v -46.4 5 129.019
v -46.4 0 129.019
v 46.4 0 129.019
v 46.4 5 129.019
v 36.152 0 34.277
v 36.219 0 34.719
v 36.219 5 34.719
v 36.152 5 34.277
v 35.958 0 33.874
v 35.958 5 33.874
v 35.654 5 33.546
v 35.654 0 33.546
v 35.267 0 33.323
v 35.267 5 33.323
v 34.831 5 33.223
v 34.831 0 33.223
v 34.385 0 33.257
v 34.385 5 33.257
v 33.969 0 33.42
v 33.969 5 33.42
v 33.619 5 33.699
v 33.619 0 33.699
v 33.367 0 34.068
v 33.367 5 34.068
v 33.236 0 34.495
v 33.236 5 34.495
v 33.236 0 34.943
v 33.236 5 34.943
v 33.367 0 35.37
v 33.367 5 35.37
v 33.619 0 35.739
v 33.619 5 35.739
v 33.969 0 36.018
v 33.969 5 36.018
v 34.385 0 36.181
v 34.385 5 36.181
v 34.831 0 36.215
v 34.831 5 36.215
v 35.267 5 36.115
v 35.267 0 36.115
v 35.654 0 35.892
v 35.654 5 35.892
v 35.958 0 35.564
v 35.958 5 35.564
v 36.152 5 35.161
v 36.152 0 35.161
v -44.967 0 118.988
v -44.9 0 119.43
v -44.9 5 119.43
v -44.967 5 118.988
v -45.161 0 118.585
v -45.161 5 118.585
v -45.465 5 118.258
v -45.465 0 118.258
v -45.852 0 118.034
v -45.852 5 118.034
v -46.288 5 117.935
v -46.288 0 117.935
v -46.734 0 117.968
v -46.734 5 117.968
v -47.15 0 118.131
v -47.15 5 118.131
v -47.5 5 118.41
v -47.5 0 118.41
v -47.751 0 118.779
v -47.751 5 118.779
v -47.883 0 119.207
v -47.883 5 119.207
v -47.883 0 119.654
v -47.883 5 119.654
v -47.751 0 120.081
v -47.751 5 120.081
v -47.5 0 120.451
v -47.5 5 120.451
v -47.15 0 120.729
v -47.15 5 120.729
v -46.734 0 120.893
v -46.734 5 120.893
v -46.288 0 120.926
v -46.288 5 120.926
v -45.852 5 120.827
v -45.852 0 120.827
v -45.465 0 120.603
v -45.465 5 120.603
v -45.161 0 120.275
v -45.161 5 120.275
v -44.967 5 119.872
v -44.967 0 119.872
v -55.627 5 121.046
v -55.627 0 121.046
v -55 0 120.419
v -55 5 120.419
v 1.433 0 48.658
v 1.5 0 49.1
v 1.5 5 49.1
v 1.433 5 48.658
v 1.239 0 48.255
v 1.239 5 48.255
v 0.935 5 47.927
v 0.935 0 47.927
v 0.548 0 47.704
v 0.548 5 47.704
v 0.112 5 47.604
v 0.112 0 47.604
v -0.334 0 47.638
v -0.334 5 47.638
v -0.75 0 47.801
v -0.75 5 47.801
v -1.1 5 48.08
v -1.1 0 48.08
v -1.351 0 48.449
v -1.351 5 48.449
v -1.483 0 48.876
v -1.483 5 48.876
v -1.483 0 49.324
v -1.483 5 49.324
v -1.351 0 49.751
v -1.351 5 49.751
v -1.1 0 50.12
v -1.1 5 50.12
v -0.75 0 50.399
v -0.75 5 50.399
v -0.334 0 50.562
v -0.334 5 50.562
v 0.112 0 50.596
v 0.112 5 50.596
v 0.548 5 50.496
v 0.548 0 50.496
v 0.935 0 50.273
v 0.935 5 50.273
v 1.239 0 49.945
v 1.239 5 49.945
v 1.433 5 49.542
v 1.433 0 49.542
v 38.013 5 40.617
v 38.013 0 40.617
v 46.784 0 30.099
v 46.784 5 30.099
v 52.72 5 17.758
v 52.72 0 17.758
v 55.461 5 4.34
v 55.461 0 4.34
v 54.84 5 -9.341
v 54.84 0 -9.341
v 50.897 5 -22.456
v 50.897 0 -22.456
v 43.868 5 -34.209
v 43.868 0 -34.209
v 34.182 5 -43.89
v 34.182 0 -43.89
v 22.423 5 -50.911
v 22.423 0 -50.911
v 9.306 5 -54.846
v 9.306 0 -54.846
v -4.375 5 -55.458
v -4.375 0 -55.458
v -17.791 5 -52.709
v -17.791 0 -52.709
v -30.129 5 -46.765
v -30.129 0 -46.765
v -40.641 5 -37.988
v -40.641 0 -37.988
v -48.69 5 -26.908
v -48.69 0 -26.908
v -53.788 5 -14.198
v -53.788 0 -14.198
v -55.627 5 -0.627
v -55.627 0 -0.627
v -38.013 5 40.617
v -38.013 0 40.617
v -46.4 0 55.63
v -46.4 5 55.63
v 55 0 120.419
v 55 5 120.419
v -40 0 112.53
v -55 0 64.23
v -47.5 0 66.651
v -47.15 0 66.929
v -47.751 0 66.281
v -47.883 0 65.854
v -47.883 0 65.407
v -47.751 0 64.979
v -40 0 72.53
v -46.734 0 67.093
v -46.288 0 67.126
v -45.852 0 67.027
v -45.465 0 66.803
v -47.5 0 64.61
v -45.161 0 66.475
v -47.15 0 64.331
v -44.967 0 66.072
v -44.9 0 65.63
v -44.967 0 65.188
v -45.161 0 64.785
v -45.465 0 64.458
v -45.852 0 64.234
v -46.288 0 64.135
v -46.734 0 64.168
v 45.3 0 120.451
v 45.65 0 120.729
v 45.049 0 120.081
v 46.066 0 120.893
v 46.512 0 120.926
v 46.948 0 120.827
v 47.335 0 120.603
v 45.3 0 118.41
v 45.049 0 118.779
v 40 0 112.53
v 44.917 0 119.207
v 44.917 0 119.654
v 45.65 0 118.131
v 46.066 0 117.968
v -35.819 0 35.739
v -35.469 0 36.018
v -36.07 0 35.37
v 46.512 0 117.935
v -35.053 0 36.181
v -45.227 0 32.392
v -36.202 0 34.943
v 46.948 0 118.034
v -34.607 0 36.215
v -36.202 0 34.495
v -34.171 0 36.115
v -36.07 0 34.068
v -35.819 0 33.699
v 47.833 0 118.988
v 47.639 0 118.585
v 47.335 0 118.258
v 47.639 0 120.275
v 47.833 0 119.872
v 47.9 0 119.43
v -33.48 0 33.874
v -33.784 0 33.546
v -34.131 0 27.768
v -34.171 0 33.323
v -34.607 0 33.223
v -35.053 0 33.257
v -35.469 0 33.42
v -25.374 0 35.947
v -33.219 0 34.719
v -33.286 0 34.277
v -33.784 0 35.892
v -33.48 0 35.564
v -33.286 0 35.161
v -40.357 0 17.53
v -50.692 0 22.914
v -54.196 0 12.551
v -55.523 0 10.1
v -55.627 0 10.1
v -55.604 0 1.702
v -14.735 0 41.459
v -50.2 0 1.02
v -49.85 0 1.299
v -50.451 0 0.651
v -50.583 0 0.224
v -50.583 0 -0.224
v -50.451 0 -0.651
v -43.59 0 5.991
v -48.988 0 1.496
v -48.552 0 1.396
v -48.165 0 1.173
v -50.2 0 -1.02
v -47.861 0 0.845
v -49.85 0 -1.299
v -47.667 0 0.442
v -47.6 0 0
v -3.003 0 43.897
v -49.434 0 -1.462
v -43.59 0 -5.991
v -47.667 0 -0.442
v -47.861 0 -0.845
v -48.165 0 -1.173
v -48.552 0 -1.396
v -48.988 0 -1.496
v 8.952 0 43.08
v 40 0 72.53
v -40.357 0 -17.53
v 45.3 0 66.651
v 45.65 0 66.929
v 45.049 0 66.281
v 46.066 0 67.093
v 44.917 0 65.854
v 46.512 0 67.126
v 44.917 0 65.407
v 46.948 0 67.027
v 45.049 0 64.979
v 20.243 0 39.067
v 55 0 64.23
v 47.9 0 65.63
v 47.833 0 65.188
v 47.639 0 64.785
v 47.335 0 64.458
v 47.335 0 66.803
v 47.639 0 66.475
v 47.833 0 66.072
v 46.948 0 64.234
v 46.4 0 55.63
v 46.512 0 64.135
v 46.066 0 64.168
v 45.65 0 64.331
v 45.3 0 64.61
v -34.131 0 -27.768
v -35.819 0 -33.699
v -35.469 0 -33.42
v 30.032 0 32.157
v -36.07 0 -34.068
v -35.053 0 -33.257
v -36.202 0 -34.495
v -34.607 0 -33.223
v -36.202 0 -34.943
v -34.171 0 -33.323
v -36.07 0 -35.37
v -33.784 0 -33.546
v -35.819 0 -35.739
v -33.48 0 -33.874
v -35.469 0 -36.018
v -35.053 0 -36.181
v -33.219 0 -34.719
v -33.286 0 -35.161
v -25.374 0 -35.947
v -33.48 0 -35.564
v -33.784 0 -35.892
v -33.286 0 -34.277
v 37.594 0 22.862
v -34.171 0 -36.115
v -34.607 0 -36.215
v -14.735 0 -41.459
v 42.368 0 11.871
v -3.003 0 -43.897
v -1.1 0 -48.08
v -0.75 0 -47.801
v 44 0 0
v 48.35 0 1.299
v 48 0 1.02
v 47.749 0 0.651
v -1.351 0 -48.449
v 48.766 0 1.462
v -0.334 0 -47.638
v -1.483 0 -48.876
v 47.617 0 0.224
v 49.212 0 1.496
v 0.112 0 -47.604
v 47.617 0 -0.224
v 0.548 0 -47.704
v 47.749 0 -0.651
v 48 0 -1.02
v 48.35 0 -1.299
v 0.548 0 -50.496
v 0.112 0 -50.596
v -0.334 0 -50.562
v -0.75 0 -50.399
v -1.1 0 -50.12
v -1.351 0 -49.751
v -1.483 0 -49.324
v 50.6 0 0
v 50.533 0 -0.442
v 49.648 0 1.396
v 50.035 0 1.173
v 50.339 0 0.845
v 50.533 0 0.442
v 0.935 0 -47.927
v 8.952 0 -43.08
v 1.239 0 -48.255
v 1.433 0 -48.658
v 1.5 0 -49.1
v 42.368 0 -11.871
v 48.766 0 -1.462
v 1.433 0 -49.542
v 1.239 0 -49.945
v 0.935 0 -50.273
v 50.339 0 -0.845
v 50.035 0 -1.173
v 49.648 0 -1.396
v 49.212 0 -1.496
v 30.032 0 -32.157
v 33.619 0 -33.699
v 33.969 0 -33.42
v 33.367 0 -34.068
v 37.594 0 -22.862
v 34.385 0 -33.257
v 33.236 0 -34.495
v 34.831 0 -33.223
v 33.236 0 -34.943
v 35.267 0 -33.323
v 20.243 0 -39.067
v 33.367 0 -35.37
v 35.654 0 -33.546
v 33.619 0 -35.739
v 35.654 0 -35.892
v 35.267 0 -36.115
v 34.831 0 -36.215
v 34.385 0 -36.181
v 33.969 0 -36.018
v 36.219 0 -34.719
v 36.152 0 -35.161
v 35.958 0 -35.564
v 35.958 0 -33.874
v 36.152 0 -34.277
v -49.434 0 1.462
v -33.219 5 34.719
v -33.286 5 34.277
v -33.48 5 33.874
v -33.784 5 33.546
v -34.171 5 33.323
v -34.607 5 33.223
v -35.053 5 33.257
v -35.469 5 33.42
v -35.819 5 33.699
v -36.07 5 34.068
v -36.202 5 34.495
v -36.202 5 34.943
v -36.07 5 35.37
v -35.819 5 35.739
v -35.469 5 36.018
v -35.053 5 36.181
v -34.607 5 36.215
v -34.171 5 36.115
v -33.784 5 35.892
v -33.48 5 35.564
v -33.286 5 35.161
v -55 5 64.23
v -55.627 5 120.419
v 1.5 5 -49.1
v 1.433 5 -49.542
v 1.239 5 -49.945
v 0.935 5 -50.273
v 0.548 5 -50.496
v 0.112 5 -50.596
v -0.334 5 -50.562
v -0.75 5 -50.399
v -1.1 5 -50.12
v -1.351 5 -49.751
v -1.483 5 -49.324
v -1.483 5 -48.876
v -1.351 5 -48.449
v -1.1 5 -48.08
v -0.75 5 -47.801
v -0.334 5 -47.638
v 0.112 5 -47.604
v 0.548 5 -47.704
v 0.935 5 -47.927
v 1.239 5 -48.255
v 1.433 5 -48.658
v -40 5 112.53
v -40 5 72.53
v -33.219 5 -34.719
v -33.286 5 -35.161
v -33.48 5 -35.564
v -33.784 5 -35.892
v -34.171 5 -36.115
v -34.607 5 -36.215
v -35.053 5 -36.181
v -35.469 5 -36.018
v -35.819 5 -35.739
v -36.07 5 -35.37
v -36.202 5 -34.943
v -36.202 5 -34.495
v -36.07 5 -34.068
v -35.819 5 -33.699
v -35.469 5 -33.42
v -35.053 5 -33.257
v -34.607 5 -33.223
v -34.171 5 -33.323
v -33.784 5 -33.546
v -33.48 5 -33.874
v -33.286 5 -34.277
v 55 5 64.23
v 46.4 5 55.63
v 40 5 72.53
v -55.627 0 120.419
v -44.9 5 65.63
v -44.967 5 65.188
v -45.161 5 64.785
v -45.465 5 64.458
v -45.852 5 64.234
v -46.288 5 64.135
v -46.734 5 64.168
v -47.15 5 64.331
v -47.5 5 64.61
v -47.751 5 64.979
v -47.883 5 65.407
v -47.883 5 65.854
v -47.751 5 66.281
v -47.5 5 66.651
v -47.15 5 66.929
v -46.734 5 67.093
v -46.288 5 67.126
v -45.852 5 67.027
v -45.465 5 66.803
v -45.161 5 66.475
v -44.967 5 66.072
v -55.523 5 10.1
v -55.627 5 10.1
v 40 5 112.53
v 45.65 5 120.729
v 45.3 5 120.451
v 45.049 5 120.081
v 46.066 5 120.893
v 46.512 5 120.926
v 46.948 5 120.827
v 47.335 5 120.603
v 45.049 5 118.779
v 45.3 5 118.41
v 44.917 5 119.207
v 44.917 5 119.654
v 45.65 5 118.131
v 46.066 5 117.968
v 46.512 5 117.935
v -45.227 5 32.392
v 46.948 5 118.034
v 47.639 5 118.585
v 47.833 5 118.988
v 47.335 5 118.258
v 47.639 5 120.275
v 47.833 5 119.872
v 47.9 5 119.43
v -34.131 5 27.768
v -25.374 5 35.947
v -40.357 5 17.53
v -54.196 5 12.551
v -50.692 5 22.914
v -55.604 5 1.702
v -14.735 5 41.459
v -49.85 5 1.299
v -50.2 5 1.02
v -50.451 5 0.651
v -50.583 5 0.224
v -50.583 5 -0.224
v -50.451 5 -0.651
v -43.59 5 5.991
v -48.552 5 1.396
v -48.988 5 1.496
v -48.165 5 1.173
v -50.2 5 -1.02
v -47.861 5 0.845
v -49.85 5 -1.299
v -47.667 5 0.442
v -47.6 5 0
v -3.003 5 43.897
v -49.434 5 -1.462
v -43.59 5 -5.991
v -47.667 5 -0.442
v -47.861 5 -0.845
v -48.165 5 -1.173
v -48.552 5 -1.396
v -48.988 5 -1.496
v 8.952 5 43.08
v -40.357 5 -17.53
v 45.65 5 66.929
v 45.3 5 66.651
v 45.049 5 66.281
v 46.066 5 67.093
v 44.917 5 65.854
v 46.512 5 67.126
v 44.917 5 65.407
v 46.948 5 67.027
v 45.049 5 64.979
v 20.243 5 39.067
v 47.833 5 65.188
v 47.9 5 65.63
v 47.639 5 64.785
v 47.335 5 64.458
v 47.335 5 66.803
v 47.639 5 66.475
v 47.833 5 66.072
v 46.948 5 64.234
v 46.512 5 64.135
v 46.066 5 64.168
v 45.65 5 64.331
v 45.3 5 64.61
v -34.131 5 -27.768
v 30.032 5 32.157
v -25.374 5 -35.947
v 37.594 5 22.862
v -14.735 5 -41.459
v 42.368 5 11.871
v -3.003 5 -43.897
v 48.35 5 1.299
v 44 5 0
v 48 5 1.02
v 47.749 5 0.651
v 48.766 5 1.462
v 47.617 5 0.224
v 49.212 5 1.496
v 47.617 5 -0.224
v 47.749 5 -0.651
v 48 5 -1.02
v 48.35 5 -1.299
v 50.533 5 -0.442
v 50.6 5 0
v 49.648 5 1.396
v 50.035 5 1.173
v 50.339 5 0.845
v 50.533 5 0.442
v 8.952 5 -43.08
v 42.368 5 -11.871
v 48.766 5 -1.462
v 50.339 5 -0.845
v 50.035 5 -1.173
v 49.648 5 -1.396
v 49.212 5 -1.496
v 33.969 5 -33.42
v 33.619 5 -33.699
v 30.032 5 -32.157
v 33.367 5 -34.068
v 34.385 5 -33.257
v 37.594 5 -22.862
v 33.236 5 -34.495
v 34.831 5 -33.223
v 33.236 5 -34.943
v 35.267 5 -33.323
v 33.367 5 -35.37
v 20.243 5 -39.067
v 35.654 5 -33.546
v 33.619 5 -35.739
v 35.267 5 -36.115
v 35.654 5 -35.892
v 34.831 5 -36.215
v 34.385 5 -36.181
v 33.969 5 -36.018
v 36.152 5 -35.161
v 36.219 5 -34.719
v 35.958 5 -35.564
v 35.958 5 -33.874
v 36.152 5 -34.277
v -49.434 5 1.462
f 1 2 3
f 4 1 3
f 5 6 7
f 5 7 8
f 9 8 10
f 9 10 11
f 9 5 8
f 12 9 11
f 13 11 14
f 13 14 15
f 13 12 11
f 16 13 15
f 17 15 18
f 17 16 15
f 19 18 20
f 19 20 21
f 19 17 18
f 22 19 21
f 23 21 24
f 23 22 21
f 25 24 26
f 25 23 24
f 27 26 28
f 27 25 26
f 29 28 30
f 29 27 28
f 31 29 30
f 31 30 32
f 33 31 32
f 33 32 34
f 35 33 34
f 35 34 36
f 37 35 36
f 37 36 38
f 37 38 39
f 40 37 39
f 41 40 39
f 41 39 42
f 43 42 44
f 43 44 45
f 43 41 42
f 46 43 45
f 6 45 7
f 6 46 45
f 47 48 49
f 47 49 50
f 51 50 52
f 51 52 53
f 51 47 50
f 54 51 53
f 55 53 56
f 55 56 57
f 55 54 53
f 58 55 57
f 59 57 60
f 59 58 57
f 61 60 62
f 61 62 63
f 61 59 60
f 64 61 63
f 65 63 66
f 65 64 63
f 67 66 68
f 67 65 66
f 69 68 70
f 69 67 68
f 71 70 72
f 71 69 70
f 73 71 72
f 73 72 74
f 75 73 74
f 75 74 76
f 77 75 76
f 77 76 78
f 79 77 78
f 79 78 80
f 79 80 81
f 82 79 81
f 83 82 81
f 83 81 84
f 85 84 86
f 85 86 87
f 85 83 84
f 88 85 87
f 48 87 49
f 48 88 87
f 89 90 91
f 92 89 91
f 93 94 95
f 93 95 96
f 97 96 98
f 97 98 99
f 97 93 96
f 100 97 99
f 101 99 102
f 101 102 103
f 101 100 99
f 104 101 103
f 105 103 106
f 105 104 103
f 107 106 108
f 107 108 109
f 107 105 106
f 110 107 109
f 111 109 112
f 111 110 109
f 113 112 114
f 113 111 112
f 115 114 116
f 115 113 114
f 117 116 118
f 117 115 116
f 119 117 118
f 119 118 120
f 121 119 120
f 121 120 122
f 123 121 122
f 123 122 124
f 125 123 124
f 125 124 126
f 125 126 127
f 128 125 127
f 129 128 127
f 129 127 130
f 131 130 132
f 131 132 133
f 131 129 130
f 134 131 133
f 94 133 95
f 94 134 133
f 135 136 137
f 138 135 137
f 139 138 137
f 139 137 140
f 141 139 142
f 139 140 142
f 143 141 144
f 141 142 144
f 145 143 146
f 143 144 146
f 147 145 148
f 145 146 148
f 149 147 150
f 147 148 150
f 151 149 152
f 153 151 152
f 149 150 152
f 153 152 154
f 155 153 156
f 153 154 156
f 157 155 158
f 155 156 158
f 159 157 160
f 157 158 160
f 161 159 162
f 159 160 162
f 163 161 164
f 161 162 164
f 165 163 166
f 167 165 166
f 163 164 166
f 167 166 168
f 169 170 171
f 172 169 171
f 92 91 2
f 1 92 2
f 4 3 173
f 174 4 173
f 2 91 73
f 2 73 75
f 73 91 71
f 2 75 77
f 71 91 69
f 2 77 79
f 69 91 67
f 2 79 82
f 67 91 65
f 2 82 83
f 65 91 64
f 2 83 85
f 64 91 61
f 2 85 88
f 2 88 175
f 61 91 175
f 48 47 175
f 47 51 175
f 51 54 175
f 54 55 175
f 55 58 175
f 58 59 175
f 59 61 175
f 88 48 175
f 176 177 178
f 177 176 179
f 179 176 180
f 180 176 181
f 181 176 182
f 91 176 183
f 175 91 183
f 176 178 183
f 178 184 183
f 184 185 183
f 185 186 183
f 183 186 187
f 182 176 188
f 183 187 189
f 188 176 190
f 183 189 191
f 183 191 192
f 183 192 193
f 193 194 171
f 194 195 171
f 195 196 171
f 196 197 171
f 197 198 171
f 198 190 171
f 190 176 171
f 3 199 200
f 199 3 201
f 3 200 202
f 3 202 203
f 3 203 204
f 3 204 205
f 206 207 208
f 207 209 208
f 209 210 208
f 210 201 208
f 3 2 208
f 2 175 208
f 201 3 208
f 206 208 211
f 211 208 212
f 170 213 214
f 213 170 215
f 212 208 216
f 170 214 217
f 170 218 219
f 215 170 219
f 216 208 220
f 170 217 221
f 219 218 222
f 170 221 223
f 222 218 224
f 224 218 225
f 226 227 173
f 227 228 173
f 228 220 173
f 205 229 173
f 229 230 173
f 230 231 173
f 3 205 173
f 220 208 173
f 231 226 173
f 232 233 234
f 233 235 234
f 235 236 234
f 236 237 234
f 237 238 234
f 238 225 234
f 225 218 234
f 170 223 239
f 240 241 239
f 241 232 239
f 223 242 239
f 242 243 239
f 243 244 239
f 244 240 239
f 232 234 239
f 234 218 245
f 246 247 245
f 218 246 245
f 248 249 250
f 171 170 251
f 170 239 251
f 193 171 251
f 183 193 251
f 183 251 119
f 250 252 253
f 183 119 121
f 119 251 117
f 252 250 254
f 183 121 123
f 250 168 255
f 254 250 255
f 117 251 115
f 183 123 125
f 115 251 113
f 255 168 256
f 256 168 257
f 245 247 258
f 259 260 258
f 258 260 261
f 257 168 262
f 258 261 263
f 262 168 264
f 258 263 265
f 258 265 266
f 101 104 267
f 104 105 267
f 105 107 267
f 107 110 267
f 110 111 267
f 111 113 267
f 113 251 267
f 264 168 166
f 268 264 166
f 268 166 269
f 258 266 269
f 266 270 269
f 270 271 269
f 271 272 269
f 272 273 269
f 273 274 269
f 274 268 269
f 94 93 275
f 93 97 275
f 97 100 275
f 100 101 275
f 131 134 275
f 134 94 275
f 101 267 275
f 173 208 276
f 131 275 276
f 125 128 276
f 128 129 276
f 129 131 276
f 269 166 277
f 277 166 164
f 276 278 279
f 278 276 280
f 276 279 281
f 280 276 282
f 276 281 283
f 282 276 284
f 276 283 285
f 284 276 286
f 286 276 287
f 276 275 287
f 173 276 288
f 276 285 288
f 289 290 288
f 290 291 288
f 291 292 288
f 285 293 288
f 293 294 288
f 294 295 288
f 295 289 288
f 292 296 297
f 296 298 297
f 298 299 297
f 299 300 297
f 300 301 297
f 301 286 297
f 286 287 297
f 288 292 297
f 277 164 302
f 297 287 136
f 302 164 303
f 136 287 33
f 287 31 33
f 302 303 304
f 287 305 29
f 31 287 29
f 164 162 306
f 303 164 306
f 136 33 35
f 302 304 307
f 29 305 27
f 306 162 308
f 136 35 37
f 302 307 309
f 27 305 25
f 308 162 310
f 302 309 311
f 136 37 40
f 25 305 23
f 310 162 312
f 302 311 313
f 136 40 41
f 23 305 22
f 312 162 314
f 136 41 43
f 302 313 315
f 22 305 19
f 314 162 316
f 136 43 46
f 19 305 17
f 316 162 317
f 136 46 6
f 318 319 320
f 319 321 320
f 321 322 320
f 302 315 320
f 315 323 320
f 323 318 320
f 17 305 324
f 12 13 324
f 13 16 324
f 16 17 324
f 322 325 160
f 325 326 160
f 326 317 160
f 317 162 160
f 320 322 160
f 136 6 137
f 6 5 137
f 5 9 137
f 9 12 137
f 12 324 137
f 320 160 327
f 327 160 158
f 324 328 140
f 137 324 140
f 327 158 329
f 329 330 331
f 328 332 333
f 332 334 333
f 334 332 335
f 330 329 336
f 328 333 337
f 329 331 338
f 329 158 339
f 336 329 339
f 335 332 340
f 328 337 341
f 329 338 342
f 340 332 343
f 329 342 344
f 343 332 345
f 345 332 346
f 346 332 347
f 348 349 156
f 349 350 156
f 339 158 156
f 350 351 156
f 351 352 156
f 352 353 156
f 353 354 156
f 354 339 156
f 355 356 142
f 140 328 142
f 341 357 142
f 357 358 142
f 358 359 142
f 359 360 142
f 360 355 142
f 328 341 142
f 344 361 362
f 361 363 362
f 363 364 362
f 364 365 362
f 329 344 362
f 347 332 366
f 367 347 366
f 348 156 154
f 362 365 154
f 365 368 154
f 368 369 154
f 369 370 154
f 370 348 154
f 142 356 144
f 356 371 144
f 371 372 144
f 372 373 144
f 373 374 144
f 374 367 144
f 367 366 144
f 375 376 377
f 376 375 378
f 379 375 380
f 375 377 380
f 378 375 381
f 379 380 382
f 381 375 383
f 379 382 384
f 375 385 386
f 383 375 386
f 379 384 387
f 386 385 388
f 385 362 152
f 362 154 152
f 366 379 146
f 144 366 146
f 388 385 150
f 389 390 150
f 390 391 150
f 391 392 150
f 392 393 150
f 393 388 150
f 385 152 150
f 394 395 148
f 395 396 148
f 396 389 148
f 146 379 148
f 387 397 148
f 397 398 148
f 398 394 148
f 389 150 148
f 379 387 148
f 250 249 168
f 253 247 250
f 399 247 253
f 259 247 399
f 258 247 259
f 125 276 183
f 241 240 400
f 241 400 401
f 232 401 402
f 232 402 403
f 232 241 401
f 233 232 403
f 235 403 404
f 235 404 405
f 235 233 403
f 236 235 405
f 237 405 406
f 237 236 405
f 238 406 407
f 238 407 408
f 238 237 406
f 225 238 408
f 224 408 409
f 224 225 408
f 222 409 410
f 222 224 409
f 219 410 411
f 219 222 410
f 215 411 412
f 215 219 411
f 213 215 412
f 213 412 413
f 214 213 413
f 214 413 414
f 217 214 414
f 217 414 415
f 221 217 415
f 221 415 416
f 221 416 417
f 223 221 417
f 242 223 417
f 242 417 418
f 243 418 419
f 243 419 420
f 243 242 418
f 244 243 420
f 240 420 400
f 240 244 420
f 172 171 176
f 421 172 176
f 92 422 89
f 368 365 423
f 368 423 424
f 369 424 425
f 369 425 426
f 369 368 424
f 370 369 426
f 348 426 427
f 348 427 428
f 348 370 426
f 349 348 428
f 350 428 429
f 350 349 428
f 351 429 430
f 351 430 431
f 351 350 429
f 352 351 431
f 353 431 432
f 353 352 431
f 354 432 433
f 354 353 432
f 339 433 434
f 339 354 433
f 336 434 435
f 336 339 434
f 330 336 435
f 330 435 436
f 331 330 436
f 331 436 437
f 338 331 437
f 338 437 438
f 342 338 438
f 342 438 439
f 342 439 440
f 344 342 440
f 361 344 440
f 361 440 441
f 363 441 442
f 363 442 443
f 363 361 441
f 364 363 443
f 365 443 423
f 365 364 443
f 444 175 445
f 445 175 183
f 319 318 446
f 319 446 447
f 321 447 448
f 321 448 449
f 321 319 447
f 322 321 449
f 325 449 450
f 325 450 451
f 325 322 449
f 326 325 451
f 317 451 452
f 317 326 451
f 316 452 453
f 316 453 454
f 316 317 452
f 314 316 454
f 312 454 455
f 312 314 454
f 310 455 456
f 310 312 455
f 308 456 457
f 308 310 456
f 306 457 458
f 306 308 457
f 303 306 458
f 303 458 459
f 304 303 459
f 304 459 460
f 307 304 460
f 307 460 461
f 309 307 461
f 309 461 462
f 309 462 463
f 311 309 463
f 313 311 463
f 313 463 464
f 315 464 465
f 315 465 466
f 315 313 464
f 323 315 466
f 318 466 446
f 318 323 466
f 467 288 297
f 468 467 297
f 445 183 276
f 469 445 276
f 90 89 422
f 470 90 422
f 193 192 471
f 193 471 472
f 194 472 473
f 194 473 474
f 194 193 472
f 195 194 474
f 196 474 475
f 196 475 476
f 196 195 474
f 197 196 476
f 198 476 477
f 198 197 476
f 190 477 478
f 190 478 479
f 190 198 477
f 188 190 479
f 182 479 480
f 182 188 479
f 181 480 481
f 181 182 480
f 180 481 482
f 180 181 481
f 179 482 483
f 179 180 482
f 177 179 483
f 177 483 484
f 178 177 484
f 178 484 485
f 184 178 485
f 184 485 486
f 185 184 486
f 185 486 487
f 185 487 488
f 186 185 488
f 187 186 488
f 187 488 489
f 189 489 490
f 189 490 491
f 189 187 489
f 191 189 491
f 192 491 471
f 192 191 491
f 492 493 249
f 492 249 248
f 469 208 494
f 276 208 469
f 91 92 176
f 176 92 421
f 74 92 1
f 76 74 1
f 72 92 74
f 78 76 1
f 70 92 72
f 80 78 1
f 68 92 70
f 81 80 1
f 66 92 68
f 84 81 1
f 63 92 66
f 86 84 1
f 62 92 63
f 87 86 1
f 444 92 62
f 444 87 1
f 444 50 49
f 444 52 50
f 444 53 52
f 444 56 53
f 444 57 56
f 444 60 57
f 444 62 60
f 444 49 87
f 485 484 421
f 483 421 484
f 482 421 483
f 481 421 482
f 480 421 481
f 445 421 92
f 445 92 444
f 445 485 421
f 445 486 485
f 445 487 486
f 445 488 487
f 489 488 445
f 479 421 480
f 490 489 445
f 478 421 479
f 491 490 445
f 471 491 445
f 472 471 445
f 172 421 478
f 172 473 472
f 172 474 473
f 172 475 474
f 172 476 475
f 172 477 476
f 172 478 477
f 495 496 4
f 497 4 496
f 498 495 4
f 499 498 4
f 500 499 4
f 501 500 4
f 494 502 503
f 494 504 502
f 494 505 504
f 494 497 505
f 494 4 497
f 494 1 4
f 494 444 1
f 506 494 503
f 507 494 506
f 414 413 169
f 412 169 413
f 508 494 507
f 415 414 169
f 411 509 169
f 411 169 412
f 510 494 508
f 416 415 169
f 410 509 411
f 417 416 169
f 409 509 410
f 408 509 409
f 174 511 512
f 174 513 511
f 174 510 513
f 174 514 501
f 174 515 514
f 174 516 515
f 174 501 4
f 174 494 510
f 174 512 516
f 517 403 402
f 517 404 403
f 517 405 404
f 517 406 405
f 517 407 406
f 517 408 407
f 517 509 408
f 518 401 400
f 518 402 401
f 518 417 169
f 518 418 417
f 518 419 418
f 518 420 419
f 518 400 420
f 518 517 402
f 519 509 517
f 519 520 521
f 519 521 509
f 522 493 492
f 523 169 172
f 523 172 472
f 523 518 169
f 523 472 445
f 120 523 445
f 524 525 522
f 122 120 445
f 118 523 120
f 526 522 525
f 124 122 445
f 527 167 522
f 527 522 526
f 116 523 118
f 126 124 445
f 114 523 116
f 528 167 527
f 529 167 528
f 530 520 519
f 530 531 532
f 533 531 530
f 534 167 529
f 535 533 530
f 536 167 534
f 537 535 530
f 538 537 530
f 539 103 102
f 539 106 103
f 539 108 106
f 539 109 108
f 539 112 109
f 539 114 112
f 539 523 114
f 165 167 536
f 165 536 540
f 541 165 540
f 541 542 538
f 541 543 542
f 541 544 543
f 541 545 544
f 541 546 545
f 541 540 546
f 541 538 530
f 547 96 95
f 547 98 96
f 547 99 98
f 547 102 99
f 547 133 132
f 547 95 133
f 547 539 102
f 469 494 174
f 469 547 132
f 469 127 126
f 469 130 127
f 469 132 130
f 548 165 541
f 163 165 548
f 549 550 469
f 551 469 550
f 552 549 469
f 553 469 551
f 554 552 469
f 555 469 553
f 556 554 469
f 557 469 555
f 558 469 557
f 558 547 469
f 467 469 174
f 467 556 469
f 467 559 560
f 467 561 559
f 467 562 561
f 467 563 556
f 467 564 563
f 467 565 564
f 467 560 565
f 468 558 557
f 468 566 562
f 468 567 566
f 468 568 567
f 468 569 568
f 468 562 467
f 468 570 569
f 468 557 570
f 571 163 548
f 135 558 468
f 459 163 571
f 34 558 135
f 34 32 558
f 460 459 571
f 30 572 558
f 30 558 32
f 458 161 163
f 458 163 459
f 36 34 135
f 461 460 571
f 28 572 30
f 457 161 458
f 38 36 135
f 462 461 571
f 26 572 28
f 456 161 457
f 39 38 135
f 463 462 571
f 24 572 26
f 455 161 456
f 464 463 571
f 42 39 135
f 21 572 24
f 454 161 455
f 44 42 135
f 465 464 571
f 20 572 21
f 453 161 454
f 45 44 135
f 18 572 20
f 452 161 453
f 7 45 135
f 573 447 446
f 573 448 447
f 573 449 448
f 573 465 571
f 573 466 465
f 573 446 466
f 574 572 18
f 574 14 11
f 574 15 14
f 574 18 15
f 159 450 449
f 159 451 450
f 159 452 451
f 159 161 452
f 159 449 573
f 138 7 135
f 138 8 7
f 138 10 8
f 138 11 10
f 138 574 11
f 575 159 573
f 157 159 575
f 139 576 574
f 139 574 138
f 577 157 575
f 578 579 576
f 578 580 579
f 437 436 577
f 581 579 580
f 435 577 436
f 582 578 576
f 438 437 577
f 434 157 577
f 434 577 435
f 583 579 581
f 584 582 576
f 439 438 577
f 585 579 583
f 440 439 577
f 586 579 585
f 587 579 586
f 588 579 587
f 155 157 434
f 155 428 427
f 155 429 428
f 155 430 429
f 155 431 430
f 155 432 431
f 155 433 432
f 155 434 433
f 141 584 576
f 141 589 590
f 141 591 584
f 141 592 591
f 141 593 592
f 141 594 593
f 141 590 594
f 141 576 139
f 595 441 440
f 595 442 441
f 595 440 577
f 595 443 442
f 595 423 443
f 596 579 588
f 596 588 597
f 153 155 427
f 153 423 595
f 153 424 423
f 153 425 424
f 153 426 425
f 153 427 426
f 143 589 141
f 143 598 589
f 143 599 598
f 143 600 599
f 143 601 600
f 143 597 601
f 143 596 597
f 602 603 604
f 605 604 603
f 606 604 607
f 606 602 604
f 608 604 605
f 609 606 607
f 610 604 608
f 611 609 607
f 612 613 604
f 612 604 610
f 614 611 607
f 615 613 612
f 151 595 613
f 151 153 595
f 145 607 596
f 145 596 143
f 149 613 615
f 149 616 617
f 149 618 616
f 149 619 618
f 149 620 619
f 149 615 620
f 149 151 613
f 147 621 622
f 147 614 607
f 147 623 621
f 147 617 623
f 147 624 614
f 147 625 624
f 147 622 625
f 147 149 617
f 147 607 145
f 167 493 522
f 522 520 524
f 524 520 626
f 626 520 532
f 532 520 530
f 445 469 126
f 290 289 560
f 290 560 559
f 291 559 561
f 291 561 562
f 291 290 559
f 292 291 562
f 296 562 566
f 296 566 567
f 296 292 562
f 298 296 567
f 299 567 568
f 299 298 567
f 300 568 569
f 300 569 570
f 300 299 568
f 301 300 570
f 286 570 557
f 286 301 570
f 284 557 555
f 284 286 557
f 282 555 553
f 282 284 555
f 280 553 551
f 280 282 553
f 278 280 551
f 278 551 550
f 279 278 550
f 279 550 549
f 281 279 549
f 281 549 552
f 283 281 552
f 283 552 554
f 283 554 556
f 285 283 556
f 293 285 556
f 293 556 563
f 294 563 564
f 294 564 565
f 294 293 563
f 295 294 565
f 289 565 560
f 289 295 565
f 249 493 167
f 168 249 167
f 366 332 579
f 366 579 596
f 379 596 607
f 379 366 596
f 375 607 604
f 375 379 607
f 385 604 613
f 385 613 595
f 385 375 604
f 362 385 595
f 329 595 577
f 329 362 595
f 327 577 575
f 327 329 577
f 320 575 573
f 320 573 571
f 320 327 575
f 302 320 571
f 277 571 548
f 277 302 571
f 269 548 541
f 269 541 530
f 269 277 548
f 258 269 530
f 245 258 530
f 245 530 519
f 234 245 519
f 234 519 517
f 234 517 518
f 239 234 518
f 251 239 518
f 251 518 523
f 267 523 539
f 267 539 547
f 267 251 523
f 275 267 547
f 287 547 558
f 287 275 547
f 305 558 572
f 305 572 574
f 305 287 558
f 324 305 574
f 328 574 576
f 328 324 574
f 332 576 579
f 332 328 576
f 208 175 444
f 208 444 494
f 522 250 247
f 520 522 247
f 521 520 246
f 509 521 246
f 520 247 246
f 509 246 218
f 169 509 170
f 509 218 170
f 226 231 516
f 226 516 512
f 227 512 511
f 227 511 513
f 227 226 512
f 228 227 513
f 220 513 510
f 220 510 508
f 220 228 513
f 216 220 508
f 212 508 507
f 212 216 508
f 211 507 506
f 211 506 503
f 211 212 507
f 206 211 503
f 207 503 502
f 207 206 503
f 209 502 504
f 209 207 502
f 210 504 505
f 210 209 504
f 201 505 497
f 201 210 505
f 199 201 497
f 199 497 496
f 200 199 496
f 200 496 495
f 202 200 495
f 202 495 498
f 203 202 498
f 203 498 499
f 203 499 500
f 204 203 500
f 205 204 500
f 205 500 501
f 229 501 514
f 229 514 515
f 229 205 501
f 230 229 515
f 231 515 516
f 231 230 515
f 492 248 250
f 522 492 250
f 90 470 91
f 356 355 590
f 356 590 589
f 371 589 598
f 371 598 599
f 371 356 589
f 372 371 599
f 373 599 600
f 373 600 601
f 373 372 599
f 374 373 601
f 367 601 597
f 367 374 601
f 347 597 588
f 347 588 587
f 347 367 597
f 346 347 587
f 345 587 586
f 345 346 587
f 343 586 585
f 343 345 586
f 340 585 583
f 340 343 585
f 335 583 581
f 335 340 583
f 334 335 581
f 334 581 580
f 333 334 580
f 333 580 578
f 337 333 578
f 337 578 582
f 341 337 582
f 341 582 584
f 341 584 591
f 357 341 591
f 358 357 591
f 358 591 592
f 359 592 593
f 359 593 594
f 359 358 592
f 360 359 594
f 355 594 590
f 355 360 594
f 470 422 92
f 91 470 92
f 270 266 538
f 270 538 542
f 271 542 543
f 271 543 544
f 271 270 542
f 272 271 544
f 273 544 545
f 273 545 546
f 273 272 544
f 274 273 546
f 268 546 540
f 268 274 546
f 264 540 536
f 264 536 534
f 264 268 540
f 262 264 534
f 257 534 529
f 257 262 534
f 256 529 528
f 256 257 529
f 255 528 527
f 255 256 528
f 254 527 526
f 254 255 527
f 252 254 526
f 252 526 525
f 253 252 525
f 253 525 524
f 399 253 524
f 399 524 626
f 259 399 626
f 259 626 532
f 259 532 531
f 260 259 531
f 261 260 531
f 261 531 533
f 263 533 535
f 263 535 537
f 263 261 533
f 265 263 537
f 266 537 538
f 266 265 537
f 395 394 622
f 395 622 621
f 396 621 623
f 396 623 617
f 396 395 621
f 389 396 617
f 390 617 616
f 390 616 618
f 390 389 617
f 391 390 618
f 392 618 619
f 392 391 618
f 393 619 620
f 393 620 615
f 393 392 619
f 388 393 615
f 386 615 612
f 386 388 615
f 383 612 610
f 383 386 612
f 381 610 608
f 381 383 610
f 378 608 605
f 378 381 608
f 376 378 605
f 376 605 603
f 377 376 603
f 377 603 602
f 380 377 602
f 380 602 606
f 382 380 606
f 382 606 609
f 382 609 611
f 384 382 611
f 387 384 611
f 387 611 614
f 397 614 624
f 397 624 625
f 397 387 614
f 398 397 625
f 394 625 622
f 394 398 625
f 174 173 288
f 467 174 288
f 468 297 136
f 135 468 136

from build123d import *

# Parameters (mm, degrees)
SKETCH_1_R               = 1.5
SKETCH_1_W               = 80
SKETCH_1_H               = 40
SKETCH_1_R_2             = 44
EXTRUDE_1_DEPTH          = 5
SKETCH_3_R               = 1.5
EXTRUDE_2_DEPTH          = 5
SKETCH_3_5_R             = 30
SKETCH_3_5_R_2           = 25
EXTRUDE_3_DEPTH          = 15
CUT_EXTRUDE_1_DEPTH      = 10
CUT_EXTRUDE_1_DEPTH_BACK = 10
SKETCH_4_W               = 124.485015382
SKETCH_4_H               = 203.768364002
SKETCH_5_W               = 73.623406186
SKETCH_5_H               = 110.319230846
CUT_EXTRUDE_2_DEPTH      = 10


with BuildPart() as part:
    # 草图1 → 凸台-拉伸1 (new body)
    with BuildSketch(Plane(origin=(0, 0, 0), x_dir=(1, 0, 0), z_dir=(0, 1, 0))):
        with BuildLine():
            Line((55, -64.230312435), (46.4, -55.630312435))
            Line((46.4, -55.630312435), (38.013398823, -40.616661254))
            ThreePointArc((38.013398823, -40.616661254), (0, 55.630312435), (-38.013398823, -40.616661254))
            Line((-38.013398823, -40.616661254), (-46.4, -55.630312435))
            Line((-46.4, -55.630312435), (-55, -64.230312435))
            Line((-55, -64.230312435), (-55, -120.419438856))
            Line((-55, -120.419438856), (-46.4, -129.019438856))
            Line((-46.4, -129.019438856), (46.4, -129.019438856))
            Line((46.4, -129.019438856), (55, -120.419438856))
            Line((55, -120.419438856), (55, -64.230312435))
        make_face()
        with Locations((-46.4, -65.630312435)):
            Circle(SKETCH_1_R, mode=Mode.SUBTRACT)
        with Locations((-46.4, -119.430312435)):
            Circle(SKETCH_1_R, mode=Mode.SUBTRACT)
        with Locations((46.4, -119.430312435)):
            Circle(SKETCH_1_R, mode=Mode.SUBTRACT)
        with Locations((46.4, -65.630312435)):
            Circle(SKETCH_1_R, mode=Mode.SUBTRACT)
        with Locations((0, -92.530312435)):
            Rectangle(SKETCH_1_W, SKETCH_1_H, mode=Mode.SUBTRACT)
        with Locations((34.718942956, 34.718942956)):
            Circle(SKETCH_1_R, mode=Mode.SUBTRACT)
        with Locations((0, -49.1)):
            Circle(SKETCH_1_R, mode=Mode.SUBTRACT)
        with Locations((-34.718942956, -34.718942956)):
            Circle(SKETCH_1_R, mode=Mode.SUBTRACT)
        with Locations((-49.1, 0)):
            Circle(SKETCH_1_R, mode=Mode.SUBTRACT)
        with Locations((-34.718942956, 34.718942956)):
            Circle(SKETCH_1_R, mode=Mode.SUBTRACT)
        Circle(SKETCH_1_R_2, mode=Mode.SUBTRACT)
        with Locations((34.718942956, -34.718942956)):
            Circle(SKETCH_1_R, mode=Mode.SUBTRACT)
        with Locations((49.1, 0)):
            Circle(SKETCH_1_R, mode=Mode.SUBTRACT)
        with Locations((0, 49.1)):
            Circle(SKETCH_1_R, mode=Mode.SUBTRACT)
    extrude(amount=EXTRUDE_1_DEPTH)

    # 草图3 → 凸台-拉伸2 (add)
    with BuildSketch(Plane(origin=(0, 0, 0), x_dir=(1, 0, 0), z_dir=(0, 1, 0))):
        Polygon((-55, -120.419438856), (-55, -64.230312435), (-55.62678138, 0.62678138), (-55.62678138, 59.784464423), (-63.6, 67.757683044), (-123.6, 67.757683044), (-132.2, 59.157683044), (-132.2, -120.419438856), (-123.6, -129.019438856), (-63.6, -129.019438856), align=None)
        with Locations((-123.6, -120.419438856)):
            Circle(SKETCH_3_R, mode=Mode.SUBTRACT)
        with Locations((-63.6, -120.419438856)):
            Circle(SKETCH_3_R, mode=Mode.SUBTRACT)
        with Locations((-123.6, 59.157683044)):
            Circle(SKETCH_3_R, mode=Mode.SUBTRACT)
        with Locations((-63.6, 59.784464423)):
            Circle(SKETCH_3_R, mode=Mode.SUBTRACT)
    extrude(amount=EXTRUDE_2_DEPTH)

    # 草图3<5> → 凸台-拉伸3 (add)
    # profile 1 of 3: a face of its own
    with BuildSketch(Plane(origin=(0, 0, 0), x_dir=(1, 0, 0), z_dir=(0, 1, 0))):
        with Locations((-93.6, -94.019438856)):
            Circle(SKETCH_3_5_R)
        with Locations((-93.6, -94.019438856)):
            Circle(SKETCH_3_5_R_2, mode=Mode.SUBTRACT)
    # profile 2 of 3: a face of its own
    with BuildSketch(Plane(origin=(0, 0, 0), x_dir=(1, 0, 0), z_dir=(0, 1, 0))):
        with Locations((-93.6, -31.152726962)):
            Circle(SKETCH_3_5_R)
        with Locations((-93.6, -31.152726962)):
            Circle(SKETCH_3_5_R_2, mode=Mode.SUBTRACT)
    # profile 3 of 3: a face of its own
    with BuildSketch(Plane(origin=(0, 0, 0), x_dir=(1, 0, 0), z_dir=(0, 1, 0))):
        with Locations((-93.6, 32.408258162)):
            Circle(SKETCH_3_5_R)
        with Locations((-93.6, 32.408258162)):
            Circle(SKETCH_3_5_R_2, mode=Mode.SUBTRACT)
    extrude(amount=EXTRUDE_3_DEPTH)

    # 草图4 → 切除-拉伸1 (cut, two sides: drawn at the far end of the back side and taken through both)
    with BuildSketch(Plane(origin=(0, 5, 0), x_dir=(1, 0, 0), z_dir=(0, 1, 0)).offset(-CUT_EXTRUDE_1_DEPTH_BACK)):
        with Locations((-117.869289071, -34.126498957)):
            Rectangle(SKETCH_4_W, SKETCH_4_H)
    extrude(amount=CUT_EXTRUDE_1_DEPTH + CUT_EXTRUDE_1_DEPTH_BACK, mode=Mode.SUBTRACT)

    # 草图5 → 切除-拉伸2 (cut)
    with BuildSketch(Plane(origin=(0, 5, 0), x_dir=(1, 0, 0), z_dir=(0, 1, 0))):
        with Locations((-91.811703093, -65.259823433)):
            Rectangle(SKETCH_5_W, SKETCH_5_H)
    extrude(amount=-CUT_EXTRUDE_2_DEPTH, mode=Mode.SUBTRACT)


with BuildPart() as cut_extrude_2_piece_1:
    # of the separate pieces the step leaves, piece 1, a body of its own (cut_extrude_2_pieces)
    add(part.part.solids().sort_by_distance((55, 0, 120.419438856))[0])


with BuildPart() as cut_extrude_2_piece_2:
    # of the separate pieces the step leaves, piece 2, a body of its own (cut_extrude_2_pieces)
    add(part.part.solids().sort_by_distance((-55.62678138, 0, 121.046220236))[0])


solid = Compound([cut_extrude_2_piece_1.part, cut_extrude_2_piece_2.part])
